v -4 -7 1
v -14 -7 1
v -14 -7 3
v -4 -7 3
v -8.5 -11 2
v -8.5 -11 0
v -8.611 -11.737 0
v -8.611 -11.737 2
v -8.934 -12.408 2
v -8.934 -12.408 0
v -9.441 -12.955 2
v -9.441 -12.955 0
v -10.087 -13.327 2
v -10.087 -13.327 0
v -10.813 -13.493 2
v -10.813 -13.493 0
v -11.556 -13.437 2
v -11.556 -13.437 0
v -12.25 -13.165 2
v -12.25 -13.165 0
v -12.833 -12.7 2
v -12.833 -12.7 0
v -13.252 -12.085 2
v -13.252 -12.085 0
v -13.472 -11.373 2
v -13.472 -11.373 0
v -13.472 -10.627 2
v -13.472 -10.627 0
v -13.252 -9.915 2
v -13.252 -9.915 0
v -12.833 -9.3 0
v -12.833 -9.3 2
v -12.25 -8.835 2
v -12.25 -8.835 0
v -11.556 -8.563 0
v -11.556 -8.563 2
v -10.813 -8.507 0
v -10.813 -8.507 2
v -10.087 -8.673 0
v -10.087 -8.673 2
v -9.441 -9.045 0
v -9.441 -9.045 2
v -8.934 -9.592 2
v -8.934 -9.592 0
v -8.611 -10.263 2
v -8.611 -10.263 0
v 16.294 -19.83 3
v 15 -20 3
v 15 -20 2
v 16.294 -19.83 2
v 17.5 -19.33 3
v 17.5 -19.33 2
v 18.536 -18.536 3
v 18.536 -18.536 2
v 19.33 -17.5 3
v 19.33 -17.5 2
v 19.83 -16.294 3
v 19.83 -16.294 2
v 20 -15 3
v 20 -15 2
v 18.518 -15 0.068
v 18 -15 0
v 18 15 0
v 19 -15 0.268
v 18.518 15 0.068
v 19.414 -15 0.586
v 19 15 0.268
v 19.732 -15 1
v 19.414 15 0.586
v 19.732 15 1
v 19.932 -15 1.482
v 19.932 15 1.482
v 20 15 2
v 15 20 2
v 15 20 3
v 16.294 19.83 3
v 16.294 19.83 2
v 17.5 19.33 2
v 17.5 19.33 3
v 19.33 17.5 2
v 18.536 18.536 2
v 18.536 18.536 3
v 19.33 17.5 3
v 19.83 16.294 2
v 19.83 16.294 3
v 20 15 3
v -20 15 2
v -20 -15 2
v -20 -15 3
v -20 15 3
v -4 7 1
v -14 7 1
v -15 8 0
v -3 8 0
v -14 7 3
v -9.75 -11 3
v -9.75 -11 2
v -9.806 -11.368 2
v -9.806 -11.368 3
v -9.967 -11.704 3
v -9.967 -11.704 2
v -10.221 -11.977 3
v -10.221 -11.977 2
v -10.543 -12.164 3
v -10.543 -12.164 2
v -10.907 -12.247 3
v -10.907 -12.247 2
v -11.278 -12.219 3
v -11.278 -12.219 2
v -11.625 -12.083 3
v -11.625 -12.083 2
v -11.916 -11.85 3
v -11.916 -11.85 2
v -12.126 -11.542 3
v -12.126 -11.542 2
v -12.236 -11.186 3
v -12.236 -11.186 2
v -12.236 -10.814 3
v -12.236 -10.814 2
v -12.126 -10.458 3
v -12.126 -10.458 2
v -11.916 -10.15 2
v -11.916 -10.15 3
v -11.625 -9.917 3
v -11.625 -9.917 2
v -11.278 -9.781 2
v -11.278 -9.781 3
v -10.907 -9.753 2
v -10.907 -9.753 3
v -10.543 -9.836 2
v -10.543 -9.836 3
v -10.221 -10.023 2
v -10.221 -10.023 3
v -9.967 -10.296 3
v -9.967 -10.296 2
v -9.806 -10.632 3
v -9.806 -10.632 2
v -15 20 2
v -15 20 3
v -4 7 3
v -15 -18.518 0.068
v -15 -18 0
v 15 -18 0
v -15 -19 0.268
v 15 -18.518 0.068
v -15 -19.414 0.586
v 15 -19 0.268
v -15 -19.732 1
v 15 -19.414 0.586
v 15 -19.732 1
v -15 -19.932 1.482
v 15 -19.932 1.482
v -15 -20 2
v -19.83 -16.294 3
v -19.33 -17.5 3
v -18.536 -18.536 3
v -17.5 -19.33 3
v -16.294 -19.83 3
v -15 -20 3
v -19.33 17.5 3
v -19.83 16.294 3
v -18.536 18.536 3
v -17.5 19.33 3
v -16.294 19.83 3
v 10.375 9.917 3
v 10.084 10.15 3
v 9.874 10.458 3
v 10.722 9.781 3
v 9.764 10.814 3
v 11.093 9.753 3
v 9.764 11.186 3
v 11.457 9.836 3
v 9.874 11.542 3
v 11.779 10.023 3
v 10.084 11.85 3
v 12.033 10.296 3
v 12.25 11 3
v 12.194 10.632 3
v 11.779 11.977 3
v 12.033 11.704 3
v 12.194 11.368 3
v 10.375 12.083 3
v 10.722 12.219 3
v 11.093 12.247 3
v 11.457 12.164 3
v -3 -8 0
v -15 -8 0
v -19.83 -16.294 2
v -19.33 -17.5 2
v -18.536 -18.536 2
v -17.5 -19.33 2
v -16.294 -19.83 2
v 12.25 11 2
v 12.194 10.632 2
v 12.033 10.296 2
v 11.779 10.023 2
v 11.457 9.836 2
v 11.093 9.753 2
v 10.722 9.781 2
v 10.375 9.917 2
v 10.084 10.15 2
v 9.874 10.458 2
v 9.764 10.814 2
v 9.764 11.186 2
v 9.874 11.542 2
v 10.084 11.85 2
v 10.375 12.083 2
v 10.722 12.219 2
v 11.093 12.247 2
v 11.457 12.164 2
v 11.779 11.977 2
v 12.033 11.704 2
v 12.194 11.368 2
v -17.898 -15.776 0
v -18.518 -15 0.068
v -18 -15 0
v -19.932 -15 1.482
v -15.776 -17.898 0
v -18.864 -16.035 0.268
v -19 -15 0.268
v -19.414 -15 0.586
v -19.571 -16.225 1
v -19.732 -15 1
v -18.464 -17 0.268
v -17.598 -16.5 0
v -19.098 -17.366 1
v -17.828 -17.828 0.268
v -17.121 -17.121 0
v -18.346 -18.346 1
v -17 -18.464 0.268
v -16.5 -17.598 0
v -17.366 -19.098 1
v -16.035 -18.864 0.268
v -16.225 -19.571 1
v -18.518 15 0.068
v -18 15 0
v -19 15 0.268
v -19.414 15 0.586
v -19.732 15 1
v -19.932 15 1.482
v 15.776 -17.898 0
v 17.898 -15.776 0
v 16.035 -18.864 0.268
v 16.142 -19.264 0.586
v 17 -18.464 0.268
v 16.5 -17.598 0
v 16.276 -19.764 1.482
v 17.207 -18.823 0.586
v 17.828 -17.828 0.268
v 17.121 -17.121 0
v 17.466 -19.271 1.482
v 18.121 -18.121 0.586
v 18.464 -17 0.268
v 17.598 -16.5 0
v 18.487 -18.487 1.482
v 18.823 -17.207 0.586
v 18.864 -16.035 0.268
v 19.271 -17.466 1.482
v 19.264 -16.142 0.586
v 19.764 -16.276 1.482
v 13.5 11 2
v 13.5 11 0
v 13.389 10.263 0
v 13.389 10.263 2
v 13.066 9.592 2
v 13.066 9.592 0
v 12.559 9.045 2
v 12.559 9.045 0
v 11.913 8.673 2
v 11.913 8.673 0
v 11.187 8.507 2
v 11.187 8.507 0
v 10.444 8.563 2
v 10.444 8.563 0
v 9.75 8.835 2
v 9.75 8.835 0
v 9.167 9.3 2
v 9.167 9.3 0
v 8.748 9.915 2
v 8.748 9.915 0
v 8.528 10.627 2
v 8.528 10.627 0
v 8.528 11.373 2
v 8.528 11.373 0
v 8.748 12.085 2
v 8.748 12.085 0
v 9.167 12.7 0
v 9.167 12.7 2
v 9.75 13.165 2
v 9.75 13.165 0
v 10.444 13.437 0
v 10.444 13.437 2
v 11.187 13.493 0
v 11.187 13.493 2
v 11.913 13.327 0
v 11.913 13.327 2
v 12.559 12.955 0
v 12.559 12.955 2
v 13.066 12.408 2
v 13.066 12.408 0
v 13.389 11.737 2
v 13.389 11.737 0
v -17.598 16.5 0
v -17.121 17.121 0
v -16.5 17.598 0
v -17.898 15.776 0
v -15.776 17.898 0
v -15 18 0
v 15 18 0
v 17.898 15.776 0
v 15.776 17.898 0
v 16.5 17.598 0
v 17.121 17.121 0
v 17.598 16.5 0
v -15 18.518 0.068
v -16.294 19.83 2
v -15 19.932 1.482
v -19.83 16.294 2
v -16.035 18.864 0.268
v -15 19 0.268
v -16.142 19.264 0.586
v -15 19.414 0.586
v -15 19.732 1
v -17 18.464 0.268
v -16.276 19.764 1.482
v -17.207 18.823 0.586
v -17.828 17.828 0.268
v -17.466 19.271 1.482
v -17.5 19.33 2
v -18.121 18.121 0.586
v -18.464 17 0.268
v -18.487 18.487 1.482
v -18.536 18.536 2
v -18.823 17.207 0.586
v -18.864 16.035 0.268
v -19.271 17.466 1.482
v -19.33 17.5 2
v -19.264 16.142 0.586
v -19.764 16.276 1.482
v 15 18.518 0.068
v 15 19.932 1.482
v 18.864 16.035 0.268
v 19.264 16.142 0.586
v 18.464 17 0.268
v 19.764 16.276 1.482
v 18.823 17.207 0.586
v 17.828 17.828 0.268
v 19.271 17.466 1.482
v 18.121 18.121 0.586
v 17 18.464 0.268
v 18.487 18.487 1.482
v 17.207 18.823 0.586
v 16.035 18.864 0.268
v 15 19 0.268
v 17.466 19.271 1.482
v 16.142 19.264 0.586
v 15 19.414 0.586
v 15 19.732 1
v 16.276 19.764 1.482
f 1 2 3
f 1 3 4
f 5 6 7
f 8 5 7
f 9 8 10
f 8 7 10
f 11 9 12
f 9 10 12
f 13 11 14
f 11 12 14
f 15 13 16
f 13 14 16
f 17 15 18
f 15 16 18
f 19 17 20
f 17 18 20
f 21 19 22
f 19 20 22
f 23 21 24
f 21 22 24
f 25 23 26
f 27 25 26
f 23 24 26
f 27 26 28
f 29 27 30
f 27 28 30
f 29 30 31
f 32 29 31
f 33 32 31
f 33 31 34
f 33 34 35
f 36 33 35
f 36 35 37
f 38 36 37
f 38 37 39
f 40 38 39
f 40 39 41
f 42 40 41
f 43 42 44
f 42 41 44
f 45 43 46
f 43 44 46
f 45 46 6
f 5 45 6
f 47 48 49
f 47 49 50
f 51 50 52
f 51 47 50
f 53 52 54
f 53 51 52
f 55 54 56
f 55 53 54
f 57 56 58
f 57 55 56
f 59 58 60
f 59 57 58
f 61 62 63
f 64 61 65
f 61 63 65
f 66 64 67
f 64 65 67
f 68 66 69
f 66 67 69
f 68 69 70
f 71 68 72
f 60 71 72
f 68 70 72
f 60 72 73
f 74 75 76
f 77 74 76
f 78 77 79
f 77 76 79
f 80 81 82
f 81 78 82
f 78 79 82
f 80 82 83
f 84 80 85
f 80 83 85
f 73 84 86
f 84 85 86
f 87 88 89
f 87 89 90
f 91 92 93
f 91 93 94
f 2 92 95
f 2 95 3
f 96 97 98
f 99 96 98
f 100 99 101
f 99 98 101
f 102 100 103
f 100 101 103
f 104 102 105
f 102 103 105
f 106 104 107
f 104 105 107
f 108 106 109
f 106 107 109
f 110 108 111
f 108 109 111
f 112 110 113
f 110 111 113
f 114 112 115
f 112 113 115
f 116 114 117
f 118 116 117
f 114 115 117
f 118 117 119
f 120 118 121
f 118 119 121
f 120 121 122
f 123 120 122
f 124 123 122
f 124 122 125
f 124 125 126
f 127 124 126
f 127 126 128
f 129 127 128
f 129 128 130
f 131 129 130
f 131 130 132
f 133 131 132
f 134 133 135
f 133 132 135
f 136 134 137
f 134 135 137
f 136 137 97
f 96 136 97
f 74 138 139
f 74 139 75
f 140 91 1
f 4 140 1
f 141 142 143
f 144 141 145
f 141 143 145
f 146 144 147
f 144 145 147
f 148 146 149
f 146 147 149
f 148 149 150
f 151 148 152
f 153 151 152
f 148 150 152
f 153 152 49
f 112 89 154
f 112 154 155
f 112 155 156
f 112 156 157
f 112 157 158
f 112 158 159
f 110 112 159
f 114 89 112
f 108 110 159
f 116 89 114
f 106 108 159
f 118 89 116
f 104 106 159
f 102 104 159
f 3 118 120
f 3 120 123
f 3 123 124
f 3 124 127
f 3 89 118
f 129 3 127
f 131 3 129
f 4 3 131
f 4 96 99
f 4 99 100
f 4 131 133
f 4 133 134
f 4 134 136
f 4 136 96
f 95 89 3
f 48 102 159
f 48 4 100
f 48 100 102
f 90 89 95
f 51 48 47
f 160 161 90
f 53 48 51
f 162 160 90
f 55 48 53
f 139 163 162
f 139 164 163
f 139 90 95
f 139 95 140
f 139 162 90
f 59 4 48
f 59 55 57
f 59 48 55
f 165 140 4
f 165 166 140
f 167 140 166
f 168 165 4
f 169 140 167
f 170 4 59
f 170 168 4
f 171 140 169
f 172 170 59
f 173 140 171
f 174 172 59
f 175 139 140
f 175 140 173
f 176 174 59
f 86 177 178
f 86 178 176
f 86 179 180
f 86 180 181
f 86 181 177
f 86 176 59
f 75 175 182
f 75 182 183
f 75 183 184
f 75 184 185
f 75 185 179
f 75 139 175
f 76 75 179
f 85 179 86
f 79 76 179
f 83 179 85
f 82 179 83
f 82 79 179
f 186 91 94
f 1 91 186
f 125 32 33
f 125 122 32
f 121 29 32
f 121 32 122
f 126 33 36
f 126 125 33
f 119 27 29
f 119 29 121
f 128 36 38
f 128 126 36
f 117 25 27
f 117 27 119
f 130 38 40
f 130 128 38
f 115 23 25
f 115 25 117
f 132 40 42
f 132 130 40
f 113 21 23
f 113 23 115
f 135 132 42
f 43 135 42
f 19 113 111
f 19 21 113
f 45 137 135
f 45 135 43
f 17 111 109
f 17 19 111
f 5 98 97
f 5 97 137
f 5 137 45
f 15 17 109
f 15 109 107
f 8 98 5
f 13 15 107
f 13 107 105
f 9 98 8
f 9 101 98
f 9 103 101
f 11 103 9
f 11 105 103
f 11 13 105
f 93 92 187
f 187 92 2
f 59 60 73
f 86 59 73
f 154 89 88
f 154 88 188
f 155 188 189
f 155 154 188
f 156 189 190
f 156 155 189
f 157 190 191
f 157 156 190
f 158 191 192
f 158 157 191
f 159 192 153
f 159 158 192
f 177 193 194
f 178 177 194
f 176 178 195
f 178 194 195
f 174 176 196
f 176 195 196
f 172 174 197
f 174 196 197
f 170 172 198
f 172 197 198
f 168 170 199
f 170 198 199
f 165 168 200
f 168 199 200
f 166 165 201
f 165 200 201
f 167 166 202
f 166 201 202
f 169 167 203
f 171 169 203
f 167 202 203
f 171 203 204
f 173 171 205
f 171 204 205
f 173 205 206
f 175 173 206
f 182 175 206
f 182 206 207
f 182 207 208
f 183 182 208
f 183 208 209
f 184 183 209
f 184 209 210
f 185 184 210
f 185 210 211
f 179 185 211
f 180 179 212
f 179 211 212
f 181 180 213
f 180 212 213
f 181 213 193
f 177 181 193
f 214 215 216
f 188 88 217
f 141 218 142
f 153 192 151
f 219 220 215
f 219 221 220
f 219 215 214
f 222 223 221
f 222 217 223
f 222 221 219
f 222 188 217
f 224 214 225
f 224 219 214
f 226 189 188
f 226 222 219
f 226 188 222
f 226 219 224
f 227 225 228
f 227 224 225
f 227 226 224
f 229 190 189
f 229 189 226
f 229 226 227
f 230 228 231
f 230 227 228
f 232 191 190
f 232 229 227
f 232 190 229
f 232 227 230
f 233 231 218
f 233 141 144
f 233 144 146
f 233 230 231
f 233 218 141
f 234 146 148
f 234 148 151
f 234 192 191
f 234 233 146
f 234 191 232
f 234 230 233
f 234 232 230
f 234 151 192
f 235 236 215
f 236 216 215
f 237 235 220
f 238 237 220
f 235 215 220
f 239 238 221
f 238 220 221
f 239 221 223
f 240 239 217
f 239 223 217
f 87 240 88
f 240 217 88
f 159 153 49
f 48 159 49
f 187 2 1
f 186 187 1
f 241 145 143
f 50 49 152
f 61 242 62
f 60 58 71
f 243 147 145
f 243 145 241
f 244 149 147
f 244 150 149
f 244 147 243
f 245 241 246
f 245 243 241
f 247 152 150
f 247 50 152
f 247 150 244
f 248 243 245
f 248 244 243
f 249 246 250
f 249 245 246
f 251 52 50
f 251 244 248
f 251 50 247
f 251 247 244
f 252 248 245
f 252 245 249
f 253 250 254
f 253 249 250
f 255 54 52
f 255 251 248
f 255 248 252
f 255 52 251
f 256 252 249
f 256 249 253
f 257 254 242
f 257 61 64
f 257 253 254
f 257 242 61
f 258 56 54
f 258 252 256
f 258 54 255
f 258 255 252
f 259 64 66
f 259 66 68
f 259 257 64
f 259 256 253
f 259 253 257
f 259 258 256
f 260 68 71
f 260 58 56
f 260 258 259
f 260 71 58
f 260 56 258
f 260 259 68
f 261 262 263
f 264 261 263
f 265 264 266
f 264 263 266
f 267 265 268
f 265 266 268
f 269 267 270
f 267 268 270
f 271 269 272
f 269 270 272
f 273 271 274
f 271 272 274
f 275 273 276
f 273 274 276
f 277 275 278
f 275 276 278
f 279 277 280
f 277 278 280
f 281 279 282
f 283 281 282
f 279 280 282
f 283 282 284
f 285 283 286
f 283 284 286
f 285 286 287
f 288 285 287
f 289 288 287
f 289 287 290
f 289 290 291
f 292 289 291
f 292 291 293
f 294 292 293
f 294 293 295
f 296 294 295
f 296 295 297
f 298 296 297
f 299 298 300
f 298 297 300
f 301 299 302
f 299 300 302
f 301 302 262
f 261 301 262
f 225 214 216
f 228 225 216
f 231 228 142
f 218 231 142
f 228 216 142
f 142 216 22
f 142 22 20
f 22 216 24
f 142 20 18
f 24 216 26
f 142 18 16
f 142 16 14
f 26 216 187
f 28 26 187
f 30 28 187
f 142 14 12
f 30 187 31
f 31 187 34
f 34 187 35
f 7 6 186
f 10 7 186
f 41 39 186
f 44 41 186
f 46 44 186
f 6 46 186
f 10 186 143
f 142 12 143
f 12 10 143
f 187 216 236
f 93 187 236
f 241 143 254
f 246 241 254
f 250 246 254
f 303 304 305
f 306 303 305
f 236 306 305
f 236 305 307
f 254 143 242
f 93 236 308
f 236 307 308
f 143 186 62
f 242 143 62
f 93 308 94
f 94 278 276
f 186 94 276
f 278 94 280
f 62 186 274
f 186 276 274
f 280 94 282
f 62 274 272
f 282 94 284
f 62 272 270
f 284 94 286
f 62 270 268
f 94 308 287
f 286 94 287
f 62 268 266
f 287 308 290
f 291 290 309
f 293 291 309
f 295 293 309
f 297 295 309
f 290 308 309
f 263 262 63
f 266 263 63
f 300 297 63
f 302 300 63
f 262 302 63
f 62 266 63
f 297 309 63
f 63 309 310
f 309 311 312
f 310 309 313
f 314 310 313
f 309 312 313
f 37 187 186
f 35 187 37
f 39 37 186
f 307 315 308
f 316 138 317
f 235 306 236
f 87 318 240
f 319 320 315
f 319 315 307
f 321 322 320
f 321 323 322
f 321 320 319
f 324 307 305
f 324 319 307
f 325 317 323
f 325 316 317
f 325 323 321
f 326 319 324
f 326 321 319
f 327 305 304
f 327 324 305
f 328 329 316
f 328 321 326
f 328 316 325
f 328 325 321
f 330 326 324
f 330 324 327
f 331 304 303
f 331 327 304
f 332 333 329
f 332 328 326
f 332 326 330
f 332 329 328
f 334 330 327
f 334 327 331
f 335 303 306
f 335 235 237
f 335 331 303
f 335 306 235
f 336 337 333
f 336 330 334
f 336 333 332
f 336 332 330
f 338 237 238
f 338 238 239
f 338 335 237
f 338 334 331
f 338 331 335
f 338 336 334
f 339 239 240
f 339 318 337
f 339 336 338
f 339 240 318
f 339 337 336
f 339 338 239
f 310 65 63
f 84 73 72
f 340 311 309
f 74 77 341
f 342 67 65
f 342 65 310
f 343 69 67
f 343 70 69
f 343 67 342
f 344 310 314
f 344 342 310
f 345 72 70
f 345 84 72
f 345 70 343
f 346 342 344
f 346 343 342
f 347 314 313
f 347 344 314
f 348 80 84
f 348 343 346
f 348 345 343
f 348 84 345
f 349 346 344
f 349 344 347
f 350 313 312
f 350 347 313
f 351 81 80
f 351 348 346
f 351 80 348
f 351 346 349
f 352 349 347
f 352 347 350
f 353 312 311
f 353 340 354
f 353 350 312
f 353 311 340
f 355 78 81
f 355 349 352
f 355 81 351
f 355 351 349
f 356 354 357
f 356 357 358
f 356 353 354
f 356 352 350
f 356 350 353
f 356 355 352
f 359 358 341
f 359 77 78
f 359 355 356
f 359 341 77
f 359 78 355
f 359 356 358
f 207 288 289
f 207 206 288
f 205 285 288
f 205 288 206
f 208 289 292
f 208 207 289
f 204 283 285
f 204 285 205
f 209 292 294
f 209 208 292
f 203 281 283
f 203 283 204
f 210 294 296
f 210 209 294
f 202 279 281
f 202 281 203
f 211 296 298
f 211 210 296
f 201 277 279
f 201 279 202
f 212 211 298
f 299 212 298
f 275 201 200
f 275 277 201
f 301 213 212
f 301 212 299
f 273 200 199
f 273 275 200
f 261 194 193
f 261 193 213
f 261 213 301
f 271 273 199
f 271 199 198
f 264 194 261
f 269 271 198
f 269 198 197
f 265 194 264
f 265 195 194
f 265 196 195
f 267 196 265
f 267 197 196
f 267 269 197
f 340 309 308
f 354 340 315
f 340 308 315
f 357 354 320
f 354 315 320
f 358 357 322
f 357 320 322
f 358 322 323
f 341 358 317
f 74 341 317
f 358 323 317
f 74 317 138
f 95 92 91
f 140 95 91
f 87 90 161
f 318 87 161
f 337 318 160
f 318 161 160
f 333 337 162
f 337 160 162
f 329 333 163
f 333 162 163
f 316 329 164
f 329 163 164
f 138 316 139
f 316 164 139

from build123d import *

# Parameters (mm, degrees)
SKETCH_W        = 40
SKETCH_H        = 40
PAD_DEPTH       = 3
SKETCH001_R     = 2.5
POCKET_DEPTH    = 2
SKETCH002_R     = 1.25
POCKET001_DEPTH = 1
FILLET_R        = 5
SKETCH003_W     = 10
SKETCH003_H     = 14
POCKET002_DEPTH = 3
CHAMFER_SIZE    = 1
FILLET002_R     = 2


with BuildPart() as part:
    # Sketch → Pad (new body)
    with BuildSketch(Plane.XY):
        Rectangle(SKETCH_W, SKETCH_H)
    extrude(amount=PAD_DEPTH)

    # Sketch001 (on Face5 of Pad) → Pocket (cut)
    with BuildSketch(Plane(origin=(0, 0, 0), x_dir=(1, 0, 0), z_dir=(0, 0, -1))):
        with Locations((-11, 11)):
            Circle(SKETCH001_R)
        with Locations((11, -11)):
            Circle(SKETCH001_R)
    extrude(amount=-POCKET_DEPTH, mode=Mode.SUBTRACT)

    # Sketch002 (on Face9 of Pocket) → Pocket001 (cut)
    with BuildSketch(Plane(origin=(0, 0, 2), x_dir=(1, 0, 0), z_dir=(0, 0, -1))):
        with Locations((-11, 11)):
            Circle(SKETCH002_R)
        with Locations((11, -11)):
            Circle(SKETCH002_R)
    extrude(amount=-POCKET001_DEPTH, mode=Mode.SUBTRACT)

    # Fillet
    fillet_edges = [part.edges().sort_by_distance(p)[0] for p in [
        (-20, -20, 1.5),
        (-20, 20, 1.5),
        (20, 20, 1.5),
        (20, -20, 1.5),
    ]]
    fillet(fillet_edges, radius=FILLET_R)

    # Sketch003 (on Face2 of Fillet) → Pocket002 (cut)
    with BuildSketch(Plane(origin=(0, 0, 0), x_dir=(1, 0, 0), z_dir=(0, 0, -1))):
        with Locations((-9, 0)):
            Rectangle(SKETCH003_W, SKETCH003_H)
    extrude(amount=-POCKET002_DEPTH, mode=Mode.SUBTRACT)

    # Chamfer
    chamfer_edges = [part.edges().sort_by_distance(p)[0] for p in [
        (-9, -7, 0),
        (-14, 0, 0),
        (-9, 7, 0),
        (-4, 0, 0),
    ]]
    chamfer(chamfer_edges, length=CHAMFER_SIZE)

    # Fillet002
    fillet002_edges = [part.edges().sort_by_distance(p)[0] for p in [
        (-18.535534, -18.535534, 0),
        (-20, 0, 0),
        (0, -20, 0),
        (18.535534, -18.535534, 0),
        (20, 0, 0),
        (18.535534, 18.535534, 0),
        (0, 20, 0),
        (-18.535534, 18.535534, 0),
    ]]
    fillet(fillet002_edges, radius=FILLET002_R)


solid = part.part
